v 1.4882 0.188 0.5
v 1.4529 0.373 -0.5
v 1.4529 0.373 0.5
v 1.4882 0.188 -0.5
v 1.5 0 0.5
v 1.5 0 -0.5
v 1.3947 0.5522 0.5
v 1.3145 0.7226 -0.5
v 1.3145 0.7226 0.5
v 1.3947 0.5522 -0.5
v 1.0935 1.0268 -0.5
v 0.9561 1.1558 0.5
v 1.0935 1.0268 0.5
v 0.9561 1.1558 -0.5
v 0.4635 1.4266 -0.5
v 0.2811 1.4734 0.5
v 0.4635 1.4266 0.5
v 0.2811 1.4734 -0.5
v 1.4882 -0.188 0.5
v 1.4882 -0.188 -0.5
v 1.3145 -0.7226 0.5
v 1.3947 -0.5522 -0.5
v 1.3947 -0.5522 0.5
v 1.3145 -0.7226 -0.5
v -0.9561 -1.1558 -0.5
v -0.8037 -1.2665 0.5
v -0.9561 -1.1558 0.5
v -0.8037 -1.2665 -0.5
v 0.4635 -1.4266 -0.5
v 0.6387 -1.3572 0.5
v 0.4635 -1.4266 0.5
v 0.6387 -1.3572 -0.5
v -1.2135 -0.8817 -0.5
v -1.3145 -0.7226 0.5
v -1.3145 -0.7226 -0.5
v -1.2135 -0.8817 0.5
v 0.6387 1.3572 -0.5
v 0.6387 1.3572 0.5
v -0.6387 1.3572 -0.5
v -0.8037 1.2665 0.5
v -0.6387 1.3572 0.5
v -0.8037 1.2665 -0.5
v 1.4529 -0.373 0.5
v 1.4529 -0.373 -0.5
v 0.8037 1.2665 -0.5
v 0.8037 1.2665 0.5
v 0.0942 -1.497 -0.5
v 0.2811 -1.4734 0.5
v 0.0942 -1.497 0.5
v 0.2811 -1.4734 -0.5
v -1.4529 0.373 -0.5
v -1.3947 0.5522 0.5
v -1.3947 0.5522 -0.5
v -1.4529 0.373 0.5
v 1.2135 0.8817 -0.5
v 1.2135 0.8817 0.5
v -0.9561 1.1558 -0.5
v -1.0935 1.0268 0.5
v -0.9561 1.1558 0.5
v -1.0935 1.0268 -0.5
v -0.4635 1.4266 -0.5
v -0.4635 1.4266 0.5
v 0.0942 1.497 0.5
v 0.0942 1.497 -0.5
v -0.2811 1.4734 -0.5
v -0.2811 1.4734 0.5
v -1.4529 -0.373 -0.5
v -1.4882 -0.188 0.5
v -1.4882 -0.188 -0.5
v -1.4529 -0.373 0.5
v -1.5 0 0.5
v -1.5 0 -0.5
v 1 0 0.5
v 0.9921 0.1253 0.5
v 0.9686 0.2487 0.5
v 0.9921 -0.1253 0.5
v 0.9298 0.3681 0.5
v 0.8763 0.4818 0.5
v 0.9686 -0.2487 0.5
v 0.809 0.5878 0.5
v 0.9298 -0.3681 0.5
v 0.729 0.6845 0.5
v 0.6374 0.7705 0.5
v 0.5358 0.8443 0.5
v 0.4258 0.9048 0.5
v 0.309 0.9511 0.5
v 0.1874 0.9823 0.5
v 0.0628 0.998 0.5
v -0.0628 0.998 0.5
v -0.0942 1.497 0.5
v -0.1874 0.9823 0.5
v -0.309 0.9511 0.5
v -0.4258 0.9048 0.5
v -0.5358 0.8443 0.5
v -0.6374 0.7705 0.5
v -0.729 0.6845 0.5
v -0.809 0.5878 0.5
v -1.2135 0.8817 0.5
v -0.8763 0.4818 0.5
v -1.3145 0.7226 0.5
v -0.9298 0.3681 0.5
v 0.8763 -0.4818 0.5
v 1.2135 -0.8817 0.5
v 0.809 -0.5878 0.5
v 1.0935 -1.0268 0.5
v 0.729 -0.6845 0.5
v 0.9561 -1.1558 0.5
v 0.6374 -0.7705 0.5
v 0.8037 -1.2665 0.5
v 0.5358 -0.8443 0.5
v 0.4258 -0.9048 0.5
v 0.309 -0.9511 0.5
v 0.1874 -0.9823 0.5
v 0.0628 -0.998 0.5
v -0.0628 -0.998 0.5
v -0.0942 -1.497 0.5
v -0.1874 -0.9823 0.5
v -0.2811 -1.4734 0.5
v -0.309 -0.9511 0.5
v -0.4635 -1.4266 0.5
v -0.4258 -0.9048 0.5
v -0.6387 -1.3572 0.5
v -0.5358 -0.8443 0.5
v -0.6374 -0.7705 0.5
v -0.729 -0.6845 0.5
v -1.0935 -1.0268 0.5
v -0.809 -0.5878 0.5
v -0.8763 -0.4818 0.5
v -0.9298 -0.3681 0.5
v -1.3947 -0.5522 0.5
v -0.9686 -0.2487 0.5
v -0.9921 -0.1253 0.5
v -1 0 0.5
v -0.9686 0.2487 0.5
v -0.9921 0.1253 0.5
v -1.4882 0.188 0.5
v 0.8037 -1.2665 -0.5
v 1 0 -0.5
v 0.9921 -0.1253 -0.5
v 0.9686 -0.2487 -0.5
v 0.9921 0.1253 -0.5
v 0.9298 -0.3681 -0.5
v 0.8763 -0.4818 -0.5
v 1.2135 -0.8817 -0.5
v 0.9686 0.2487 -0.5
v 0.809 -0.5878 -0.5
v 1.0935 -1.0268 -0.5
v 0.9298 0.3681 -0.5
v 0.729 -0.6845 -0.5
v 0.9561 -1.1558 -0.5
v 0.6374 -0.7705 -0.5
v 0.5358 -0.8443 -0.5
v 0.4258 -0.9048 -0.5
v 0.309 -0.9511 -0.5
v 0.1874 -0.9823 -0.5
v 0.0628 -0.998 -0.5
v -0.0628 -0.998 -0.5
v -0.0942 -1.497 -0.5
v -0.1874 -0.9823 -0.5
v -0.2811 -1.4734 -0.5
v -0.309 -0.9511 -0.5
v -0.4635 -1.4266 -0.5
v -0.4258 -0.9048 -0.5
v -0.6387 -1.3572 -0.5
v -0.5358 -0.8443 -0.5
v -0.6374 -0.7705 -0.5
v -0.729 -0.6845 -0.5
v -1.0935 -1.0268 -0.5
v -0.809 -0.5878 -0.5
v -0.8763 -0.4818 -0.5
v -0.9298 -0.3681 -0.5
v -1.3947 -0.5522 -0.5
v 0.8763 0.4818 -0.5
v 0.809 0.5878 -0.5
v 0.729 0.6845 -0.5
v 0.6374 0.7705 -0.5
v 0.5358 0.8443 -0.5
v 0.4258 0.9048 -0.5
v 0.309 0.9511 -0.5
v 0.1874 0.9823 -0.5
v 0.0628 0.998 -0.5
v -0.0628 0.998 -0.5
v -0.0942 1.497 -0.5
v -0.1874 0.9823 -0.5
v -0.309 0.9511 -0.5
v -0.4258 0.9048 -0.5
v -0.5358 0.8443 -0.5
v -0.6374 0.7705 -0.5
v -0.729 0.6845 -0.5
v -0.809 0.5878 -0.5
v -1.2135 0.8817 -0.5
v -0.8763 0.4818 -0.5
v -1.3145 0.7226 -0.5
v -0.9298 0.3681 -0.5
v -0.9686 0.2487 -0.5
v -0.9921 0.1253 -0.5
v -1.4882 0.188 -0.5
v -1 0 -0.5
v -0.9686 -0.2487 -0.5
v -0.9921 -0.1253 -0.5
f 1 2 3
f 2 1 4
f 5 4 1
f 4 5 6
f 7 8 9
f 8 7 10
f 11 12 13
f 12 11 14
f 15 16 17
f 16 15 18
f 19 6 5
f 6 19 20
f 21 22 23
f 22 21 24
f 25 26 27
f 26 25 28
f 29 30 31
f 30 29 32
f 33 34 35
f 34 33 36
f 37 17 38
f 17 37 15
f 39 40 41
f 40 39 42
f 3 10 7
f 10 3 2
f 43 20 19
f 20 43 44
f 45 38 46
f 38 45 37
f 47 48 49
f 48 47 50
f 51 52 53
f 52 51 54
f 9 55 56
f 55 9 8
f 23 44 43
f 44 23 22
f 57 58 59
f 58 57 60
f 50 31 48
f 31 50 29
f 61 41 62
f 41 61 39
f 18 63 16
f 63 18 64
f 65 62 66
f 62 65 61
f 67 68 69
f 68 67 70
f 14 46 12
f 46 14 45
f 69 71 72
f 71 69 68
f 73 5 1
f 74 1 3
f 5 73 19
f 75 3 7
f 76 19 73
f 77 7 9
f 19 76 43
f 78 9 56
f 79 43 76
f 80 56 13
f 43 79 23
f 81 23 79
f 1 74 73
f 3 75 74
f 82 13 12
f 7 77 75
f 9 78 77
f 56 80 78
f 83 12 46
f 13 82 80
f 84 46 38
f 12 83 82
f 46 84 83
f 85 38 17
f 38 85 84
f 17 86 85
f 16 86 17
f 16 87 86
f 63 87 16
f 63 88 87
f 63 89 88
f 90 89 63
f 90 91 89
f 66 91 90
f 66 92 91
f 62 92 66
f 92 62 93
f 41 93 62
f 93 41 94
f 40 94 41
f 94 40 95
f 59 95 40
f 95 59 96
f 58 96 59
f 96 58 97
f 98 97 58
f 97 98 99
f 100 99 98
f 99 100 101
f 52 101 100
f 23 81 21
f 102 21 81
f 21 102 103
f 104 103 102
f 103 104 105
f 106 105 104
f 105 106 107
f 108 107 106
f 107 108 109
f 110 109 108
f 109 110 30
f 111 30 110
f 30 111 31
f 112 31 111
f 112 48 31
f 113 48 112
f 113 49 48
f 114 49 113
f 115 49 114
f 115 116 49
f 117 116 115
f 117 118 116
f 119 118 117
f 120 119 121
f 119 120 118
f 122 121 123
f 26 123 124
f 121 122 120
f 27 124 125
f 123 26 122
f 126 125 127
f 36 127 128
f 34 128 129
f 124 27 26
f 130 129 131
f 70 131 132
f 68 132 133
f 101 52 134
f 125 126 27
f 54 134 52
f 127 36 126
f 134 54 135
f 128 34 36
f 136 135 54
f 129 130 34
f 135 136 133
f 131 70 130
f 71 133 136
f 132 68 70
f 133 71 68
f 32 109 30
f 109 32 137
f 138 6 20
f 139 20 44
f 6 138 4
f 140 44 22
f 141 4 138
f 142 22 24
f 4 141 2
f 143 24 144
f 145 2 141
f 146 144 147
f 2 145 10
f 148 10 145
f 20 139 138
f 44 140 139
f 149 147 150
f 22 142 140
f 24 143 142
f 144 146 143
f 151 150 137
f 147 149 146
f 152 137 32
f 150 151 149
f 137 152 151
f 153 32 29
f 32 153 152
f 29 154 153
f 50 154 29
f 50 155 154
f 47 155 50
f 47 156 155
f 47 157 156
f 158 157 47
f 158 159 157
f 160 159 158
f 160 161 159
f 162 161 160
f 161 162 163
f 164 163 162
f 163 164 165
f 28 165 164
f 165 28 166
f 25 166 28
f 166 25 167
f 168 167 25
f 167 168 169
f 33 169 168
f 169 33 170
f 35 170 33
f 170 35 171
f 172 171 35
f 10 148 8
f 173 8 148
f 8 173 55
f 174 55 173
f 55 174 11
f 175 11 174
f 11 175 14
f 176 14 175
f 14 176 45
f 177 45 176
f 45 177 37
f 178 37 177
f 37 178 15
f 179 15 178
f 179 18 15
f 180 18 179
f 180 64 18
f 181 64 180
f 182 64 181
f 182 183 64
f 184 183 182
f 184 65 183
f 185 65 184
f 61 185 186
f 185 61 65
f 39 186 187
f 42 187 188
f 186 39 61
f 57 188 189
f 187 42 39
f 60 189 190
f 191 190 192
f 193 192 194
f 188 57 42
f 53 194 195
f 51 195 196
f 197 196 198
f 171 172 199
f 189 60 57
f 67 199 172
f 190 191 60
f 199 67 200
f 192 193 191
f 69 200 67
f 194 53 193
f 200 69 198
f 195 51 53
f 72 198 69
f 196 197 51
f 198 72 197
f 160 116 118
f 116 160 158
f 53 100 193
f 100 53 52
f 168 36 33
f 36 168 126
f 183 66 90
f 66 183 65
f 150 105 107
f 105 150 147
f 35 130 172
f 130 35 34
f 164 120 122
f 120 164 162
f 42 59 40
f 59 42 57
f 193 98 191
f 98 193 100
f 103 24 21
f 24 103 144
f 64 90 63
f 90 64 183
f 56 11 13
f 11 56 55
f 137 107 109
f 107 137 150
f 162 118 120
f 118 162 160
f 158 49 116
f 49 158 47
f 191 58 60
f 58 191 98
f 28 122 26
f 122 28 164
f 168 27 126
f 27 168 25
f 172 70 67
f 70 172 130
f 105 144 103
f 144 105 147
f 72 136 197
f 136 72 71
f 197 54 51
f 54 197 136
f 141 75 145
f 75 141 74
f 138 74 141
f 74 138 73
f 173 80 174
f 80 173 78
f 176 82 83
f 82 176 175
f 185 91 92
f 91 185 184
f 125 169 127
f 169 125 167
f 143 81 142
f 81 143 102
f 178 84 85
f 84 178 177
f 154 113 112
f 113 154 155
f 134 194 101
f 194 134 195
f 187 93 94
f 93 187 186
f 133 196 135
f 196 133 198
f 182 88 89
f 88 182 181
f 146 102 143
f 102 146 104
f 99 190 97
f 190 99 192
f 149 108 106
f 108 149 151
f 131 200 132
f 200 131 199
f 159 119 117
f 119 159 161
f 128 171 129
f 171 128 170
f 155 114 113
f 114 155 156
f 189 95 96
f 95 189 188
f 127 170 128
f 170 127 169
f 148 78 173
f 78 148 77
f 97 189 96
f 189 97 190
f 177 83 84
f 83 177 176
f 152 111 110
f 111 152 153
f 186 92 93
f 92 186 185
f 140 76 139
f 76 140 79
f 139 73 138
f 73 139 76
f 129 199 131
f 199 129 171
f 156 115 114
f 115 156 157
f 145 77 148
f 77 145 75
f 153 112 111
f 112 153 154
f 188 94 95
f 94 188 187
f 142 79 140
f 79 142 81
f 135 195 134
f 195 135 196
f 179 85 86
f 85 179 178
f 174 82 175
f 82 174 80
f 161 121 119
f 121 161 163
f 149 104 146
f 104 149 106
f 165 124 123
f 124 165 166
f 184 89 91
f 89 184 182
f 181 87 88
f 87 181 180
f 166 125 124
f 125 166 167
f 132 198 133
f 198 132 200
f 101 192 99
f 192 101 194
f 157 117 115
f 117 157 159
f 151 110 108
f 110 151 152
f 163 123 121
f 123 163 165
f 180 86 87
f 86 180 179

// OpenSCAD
$fn = 50;


difference() {
	union() {
		translate(v = [0, 0, -0.5000000000]) {
			cylinder(h = 1, r = 1.5000000000);
		}
	}
	union() {
		translate(v = [0, 0, -100.0000000000]) {
			cylinder(h = 200, r = 1.0000000000);
		}
	}
}
